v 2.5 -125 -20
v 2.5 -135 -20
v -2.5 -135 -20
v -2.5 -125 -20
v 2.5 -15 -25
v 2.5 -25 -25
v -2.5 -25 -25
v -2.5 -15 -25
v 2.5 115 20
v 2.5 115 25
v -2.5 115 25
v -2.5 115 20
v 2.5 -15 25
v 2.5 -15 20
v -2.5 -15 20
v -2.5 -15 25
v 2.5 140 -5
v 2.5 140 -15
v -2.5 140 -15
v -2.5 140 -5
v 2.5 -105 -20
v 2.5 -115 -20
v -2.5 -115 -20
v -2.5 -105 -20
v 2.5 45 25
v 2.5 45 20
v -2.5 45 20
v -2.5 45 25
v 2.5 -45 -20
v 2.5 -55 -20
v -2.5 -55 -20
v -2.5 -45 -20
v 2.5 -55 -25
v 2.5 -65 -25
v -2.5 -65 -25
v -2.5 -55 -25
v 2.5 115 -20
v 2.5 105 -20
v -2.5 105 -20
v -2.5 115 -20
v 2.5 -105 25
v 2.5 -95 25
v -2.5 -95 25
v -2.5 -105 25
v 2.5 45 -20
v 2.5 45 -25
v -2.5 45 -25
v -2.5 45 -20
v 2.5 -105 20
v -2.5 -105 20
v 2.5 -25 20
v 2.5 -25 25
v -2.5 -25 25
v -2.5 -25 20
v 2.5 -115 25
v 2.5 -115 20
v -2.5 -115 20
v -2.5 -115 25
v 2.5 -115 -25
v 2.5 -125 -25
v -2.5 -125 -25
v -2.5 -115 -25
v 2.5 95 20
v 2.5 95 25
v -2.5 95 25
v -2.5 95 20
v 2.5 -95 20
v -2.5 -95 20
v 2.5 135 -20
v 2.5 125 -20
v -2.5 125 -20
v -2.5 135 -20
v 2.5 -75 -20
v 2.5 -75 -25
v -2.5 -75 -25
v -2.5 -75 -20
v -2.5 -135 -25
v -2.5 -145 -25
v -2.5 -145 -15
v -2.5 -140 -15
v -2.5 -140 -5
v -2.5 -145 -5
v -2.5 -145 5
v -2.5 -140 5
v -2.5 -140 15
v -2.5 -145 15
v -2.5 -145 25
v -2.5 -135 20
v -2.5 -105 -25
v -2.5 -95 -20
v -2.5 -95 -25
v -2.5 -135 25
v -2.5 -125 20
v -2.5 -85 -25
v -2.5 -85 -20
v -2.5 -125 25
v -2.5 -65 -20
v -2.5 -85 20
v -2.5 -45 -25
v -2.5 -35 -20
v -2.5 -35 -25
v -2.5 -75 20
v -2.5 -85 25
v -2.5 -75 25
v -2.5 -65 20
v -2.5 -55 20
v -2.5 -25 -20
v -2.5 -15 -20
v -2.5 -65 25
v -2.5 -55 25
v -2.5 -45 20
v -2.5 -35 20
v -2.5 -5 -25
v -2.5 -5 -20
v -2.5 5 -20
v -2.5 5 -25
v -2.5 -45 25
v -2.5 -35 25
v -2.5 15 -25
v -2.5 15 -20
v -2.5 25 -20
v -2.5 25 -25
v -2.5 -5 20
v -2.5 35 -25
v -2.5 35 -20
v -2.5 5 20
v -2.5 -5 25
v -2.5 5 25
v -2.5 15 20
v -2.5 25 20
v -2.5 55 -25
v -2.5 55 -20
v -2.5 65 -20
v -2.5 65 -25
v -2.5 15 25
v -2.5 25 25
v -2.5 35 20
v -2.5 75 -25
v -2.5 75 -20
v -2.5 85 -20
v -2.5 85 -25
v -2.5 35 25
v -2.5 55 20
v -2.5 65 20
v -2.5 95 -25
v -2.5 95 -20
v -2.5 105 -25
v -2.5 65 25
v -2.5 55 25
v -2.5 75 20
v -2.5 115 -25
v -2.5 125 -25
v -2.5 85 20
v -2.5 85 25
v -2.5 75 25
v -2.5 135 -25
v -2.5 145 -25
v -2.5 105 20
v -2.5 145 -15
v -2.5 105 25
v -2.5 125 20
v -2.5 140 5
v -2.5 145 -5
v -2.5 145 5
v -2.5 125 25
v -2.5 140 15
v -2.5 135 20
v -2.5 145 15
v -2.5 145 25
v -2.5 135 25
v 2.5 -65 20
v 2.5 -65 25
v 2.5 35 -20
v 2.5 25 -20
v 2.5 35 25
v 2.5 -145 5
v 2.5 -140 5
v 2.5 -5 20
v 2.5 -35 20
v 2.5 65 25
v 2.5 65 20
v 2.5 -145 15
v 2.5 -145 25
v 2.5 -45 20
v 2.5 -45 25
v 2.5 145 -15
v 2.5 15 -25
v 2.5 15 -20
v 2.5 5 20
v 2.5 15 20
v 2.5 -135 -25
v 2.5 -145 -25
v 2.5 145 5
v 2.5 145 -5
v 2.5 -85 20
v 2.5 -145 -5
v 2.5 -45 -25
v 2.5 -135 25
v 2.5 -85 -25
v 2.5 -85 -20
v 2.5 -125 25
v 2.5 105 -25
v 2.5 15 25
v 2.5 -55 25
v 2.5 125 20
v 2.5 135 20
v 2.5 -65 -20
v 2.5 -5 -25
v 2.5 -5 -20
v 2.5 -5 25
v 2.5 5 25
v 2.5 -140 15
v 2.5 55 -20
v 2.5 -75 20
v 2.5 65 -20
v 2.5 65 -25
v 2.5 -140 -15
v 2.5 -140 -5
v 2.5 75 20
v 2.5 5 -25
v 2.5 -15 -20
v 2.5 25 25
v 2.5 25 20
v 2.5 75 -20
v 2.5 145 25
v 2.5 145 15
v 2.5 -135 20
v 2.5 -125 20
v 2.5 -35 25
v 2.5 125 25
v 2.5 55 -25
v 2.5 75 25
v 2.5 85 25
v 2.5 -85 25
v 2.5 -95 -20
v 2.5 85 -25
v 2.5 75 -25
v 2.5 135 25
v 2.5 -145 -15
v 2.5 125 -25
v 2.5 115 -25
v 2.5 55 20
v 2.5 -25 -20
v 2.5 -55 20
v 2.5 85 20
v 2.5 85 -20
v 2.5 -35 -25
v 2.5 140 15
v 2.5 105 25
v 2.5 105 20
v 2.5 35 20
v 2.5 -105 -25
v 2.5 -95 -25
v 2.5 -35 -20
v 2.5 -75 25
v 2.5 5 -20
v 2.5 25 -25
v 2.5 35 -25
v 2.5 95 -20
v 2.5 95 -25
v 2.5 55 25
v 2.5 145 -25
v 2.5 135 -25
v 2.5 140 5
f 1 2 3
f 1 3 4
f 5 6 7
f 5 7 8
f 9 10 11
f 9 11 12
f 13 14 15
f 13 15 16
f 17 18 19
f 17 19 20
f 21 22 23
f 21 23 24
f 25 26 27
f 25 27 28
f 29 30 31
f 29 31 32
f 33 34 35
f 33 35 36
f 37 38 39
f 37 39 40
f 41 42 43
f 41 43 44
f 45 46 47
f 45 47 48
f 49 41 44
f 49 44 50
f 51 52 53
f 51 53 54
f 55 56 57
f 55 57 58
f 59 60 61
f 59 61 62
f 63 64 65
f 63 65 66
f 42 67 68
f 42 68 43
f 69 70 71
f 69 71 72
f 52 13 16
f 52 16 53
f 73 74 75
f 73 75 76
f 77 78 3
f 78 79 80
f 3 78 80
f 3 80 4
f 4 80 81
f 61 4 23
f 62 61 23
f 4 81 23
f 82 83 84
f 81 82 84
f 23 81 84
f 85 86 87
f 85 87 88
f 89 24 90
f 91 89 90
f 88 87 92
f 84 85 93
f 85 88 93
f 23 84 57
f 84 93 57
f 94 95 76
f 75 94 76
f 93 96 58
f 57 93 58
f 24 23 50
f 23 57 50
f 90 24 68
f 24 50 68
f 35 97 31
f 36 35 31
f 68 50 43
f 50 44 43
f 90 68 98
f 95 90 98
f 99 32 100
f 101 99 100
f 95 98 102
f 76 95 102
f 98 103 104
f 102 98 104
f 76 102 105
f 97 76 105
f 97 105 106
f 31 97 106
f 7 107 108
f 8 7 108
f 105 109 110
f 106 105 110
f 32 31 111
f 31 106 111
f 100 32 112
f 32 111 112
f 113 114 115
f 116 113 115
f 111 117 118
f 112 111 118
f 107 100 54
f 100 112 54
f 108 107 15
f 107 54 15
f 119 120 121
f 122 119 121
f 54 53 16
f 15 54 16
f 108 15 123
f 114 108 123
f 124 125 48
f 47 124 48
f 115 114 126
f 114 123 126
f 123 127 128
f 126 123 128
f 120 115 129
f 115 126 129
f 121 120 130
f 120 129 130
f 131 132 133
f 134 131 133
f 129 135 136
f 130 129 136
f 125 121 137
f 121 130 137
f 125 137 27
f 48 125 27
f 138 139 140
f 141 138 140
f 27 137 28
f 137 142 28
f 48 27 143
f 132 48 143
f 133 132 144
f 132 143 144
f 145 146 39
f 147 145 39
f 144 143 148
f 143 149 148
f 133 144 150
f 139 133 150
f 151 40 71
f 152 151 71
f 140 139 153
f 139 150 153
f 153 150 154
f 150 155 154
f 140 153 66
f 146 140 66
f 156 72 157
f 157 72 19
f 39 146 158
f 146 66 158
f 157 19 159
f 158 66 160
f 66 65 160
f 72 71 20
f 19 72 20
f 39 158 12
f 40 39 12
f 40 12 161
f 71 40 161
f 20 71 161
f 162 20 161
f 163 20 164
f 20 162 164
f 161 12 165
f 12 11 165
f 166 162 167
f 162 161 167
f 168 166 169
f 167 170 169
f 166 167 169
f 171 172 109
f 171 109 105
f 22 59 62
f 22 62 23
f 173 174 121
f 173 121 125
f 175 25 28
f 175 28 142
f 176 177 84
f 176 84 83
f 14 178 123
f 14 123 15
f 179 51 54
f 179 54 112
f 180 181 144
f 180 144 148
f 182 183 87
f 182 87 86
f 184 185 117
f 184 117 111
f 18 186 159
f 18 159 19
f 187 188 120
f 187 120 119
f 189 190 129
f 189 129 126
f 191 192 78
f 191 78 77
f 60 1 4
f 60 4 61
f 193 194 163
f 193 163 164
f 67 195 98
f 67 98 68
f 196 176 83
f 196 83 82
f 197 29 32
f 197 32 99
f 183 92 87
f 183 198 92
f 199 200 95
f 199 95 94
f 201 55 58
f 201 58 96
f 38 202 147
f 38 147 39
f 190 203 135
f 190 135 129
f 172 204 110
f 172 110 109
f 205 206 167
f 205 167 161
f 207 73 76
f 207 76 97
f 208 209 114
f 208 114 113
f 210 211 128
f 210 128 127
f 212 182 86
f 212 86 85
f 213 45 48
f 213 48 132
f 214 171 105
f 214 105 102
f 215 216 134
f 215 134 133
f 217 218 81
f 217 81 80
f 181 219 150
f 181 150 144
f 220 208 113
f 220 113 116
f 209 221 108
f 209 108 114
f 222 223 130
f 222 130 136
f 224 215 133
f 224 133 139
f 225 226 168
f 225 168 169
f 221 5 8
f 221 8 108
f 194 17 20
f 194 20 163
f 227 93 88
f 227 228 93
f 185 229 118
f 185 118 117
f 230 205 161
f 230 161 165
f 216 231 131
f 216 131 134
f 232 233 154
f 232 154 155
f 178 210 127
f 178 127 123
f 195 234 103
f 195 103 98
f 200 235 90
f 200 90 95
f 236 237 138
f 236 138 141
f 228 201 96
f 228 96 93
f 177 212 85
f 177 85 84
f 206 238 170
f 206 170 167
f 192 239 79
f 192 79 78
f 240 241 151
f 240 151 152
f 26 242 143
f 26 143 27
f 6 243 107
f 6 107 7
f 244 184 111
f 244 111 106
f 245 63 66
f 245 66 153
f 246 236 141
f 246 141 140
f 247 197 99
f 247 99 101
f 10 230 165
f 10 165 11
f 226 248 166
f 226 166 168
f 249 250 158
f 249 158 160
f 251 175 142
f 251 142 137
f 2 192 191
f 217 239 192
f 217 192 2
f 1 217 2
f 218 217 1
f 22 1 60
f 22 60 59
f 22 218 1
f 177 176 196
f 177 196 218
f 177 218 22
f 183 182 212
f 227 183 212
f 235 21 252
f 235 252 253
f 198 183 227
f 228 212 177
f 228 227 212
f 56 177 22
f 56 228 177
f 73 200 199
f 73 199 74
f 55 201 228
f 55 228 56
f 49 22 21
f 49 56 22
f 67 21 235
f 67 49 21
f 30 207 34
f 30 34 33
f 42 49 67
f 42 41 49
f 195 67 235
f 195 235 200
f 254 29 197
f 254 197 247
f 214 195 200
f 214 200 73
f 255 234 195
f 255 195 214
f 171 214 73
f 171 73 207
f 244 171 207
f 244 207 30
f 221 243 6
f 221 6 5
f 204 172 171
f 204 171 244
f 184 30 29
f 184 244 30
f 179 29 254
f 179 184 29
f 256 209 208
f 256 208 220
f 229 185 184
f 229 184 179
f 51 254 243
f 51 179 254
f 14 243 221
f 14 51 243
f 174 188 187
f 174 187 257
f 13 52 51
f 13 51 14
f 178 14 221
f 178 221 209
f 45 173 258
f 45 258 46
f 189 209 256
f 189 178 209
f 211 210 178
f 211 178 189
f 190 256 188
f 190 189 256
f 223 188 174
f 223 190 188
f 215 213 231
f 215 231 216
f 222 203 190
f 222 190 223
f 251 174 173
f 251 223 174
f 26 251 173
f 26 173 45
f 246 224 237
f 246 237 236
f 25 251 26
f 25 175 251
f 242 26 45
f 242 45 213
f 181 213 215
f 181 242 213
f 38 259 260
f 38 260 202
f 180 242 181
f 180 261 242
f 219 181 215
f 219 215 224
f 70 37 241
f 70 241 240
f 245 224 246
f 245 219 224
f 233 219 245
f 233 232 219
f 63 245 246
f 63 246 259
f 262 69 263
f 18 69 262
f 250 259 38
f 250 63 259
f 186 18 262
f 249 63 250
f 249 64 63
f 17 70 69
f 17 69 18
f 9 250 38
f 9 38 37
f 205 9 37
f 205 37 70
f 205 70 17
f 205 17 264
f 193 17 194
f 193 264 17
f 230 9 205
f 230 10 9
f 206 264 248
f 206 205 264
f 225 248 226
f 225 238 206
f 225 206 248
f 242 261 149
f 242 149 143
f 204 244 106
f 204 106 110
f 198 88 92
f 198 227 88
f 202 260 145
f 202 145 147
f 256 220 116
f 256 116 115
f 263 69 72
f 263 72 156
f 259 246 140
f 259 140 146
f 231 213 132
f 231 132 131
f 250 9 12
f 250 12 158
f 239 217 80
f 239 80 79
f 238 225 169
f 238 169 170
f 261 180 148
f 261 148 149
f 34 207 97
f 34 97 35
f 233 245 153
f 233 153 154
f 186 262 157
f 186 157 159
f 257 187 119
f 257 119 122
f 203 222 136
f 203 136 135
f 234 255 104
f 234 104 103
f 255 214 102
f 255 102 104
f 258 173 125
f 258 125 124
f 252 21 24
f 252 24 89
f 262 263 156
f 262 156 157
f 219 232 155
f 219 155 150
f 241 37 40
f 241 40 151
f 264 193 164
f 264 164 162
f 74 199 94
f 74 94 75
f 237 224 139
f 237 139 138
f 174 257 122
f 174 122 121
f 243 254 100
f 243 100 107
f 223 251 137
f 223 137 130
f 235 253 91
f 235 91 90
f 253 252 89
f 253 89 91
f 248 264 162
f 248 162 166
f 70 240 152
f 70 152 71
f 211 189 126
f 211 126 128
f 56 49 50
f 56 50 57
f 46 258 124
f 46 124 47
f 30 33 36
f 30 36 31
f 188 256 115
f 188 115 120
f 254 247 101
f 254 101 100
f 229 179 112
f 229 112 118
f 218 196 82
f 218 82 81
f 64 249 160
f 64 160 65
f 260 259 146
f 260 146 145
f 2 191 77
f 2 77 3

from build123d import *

# Parameters (mm, degrees)
F1_DEPTH = 2.5


# Not quite as in the source:
# - ends of sketch curves that miss each other by under 0.0002 mm in the source are joined


with BuildPart() as f1:
    # F0 (on Right) → F1 (new body, symmetric)
    with BuildSketch(Plane.YZ):
        Polygon((-135, 25), (-145, 25), (-144.9999958277, 15), (-139.9999958277, 15), (-139.9999958277, 5), (-144.9999958277, 5), (-144.9999958277, -5), (-139.9999958277, -5), (-139.9999958277, -15), (-144.9999958277, -15), (-144.9999958277, -25), (-135, -25), (-135, -20), (-125, -20), (-125, -25), (-115, -25), (-115, -20), (-105, -20), (-105, -25), (-95, -25), (-95, -20), (-85, -20), (-85, -25), (-75, -25), (-75, -20), (-65, -20), (-65, -25), (-55, -25), (-55, -20), (-45, -20), (-45, -25), (-35, -25), (-35, -20), (-25, -20), (-25, -25), (-15, -25), (-15, -20), (-5, -20), (-5, -25), (5, -25), (5, -20), (15, -20), (15, -25), (25, -25), (25, -20), (35, -20), (35, -25), (45, -25), (45, -20), (55, -20), (55, -25), (65, -25), (65, -20), (75, -20), (75, -25), (85, -25), (85, -20), (95, -20), (95, -25), (105, -25), (105, -20), (115, -20), (115, -25), (125, -25), (125, -20), (135, -20), (135, -25), (145, -25), (145, -15), (140, -15), (140, -5), (145, -5), (145, 5), (140, 5), (140, 15), (145, 15), (145, 25), (135, 25), (135, 20), (125, 20), (125, 25), (115, 25), (115, 20), (105, 20), (105, 25), (95, 25), (95, 20), (85, 20), (85, 25), (75, 25), (75, 20), (65, 20), (65, 25), (55, 25), (55, 20), (45, 20), (45, 25), (35, 25), (35, 20), (25, 20), (25, 25), (15, 25), (15, 20), (5, 20), (5, 25), (-5, 25), (-5, 20), (-15, 20), (-15, 25), (-25, 25), (-25, 20), (-35, 20), (-35, 25), (-45, 25), (-45, 20), (-55, 20), (-55, 25), (-65, 25), (-65, 20), (-75, 20), (-75, 25), (-85, 25), (-85, 20), (-95, 20), (-95, 25), (-105, 25), (-105, 20), (-115, 20), (-115, 25), (-125, 25), (-125, 20), (-135, 20), align=None)
    extrude(amount=F1_DEPTH, both=True)


solid = f1.part
